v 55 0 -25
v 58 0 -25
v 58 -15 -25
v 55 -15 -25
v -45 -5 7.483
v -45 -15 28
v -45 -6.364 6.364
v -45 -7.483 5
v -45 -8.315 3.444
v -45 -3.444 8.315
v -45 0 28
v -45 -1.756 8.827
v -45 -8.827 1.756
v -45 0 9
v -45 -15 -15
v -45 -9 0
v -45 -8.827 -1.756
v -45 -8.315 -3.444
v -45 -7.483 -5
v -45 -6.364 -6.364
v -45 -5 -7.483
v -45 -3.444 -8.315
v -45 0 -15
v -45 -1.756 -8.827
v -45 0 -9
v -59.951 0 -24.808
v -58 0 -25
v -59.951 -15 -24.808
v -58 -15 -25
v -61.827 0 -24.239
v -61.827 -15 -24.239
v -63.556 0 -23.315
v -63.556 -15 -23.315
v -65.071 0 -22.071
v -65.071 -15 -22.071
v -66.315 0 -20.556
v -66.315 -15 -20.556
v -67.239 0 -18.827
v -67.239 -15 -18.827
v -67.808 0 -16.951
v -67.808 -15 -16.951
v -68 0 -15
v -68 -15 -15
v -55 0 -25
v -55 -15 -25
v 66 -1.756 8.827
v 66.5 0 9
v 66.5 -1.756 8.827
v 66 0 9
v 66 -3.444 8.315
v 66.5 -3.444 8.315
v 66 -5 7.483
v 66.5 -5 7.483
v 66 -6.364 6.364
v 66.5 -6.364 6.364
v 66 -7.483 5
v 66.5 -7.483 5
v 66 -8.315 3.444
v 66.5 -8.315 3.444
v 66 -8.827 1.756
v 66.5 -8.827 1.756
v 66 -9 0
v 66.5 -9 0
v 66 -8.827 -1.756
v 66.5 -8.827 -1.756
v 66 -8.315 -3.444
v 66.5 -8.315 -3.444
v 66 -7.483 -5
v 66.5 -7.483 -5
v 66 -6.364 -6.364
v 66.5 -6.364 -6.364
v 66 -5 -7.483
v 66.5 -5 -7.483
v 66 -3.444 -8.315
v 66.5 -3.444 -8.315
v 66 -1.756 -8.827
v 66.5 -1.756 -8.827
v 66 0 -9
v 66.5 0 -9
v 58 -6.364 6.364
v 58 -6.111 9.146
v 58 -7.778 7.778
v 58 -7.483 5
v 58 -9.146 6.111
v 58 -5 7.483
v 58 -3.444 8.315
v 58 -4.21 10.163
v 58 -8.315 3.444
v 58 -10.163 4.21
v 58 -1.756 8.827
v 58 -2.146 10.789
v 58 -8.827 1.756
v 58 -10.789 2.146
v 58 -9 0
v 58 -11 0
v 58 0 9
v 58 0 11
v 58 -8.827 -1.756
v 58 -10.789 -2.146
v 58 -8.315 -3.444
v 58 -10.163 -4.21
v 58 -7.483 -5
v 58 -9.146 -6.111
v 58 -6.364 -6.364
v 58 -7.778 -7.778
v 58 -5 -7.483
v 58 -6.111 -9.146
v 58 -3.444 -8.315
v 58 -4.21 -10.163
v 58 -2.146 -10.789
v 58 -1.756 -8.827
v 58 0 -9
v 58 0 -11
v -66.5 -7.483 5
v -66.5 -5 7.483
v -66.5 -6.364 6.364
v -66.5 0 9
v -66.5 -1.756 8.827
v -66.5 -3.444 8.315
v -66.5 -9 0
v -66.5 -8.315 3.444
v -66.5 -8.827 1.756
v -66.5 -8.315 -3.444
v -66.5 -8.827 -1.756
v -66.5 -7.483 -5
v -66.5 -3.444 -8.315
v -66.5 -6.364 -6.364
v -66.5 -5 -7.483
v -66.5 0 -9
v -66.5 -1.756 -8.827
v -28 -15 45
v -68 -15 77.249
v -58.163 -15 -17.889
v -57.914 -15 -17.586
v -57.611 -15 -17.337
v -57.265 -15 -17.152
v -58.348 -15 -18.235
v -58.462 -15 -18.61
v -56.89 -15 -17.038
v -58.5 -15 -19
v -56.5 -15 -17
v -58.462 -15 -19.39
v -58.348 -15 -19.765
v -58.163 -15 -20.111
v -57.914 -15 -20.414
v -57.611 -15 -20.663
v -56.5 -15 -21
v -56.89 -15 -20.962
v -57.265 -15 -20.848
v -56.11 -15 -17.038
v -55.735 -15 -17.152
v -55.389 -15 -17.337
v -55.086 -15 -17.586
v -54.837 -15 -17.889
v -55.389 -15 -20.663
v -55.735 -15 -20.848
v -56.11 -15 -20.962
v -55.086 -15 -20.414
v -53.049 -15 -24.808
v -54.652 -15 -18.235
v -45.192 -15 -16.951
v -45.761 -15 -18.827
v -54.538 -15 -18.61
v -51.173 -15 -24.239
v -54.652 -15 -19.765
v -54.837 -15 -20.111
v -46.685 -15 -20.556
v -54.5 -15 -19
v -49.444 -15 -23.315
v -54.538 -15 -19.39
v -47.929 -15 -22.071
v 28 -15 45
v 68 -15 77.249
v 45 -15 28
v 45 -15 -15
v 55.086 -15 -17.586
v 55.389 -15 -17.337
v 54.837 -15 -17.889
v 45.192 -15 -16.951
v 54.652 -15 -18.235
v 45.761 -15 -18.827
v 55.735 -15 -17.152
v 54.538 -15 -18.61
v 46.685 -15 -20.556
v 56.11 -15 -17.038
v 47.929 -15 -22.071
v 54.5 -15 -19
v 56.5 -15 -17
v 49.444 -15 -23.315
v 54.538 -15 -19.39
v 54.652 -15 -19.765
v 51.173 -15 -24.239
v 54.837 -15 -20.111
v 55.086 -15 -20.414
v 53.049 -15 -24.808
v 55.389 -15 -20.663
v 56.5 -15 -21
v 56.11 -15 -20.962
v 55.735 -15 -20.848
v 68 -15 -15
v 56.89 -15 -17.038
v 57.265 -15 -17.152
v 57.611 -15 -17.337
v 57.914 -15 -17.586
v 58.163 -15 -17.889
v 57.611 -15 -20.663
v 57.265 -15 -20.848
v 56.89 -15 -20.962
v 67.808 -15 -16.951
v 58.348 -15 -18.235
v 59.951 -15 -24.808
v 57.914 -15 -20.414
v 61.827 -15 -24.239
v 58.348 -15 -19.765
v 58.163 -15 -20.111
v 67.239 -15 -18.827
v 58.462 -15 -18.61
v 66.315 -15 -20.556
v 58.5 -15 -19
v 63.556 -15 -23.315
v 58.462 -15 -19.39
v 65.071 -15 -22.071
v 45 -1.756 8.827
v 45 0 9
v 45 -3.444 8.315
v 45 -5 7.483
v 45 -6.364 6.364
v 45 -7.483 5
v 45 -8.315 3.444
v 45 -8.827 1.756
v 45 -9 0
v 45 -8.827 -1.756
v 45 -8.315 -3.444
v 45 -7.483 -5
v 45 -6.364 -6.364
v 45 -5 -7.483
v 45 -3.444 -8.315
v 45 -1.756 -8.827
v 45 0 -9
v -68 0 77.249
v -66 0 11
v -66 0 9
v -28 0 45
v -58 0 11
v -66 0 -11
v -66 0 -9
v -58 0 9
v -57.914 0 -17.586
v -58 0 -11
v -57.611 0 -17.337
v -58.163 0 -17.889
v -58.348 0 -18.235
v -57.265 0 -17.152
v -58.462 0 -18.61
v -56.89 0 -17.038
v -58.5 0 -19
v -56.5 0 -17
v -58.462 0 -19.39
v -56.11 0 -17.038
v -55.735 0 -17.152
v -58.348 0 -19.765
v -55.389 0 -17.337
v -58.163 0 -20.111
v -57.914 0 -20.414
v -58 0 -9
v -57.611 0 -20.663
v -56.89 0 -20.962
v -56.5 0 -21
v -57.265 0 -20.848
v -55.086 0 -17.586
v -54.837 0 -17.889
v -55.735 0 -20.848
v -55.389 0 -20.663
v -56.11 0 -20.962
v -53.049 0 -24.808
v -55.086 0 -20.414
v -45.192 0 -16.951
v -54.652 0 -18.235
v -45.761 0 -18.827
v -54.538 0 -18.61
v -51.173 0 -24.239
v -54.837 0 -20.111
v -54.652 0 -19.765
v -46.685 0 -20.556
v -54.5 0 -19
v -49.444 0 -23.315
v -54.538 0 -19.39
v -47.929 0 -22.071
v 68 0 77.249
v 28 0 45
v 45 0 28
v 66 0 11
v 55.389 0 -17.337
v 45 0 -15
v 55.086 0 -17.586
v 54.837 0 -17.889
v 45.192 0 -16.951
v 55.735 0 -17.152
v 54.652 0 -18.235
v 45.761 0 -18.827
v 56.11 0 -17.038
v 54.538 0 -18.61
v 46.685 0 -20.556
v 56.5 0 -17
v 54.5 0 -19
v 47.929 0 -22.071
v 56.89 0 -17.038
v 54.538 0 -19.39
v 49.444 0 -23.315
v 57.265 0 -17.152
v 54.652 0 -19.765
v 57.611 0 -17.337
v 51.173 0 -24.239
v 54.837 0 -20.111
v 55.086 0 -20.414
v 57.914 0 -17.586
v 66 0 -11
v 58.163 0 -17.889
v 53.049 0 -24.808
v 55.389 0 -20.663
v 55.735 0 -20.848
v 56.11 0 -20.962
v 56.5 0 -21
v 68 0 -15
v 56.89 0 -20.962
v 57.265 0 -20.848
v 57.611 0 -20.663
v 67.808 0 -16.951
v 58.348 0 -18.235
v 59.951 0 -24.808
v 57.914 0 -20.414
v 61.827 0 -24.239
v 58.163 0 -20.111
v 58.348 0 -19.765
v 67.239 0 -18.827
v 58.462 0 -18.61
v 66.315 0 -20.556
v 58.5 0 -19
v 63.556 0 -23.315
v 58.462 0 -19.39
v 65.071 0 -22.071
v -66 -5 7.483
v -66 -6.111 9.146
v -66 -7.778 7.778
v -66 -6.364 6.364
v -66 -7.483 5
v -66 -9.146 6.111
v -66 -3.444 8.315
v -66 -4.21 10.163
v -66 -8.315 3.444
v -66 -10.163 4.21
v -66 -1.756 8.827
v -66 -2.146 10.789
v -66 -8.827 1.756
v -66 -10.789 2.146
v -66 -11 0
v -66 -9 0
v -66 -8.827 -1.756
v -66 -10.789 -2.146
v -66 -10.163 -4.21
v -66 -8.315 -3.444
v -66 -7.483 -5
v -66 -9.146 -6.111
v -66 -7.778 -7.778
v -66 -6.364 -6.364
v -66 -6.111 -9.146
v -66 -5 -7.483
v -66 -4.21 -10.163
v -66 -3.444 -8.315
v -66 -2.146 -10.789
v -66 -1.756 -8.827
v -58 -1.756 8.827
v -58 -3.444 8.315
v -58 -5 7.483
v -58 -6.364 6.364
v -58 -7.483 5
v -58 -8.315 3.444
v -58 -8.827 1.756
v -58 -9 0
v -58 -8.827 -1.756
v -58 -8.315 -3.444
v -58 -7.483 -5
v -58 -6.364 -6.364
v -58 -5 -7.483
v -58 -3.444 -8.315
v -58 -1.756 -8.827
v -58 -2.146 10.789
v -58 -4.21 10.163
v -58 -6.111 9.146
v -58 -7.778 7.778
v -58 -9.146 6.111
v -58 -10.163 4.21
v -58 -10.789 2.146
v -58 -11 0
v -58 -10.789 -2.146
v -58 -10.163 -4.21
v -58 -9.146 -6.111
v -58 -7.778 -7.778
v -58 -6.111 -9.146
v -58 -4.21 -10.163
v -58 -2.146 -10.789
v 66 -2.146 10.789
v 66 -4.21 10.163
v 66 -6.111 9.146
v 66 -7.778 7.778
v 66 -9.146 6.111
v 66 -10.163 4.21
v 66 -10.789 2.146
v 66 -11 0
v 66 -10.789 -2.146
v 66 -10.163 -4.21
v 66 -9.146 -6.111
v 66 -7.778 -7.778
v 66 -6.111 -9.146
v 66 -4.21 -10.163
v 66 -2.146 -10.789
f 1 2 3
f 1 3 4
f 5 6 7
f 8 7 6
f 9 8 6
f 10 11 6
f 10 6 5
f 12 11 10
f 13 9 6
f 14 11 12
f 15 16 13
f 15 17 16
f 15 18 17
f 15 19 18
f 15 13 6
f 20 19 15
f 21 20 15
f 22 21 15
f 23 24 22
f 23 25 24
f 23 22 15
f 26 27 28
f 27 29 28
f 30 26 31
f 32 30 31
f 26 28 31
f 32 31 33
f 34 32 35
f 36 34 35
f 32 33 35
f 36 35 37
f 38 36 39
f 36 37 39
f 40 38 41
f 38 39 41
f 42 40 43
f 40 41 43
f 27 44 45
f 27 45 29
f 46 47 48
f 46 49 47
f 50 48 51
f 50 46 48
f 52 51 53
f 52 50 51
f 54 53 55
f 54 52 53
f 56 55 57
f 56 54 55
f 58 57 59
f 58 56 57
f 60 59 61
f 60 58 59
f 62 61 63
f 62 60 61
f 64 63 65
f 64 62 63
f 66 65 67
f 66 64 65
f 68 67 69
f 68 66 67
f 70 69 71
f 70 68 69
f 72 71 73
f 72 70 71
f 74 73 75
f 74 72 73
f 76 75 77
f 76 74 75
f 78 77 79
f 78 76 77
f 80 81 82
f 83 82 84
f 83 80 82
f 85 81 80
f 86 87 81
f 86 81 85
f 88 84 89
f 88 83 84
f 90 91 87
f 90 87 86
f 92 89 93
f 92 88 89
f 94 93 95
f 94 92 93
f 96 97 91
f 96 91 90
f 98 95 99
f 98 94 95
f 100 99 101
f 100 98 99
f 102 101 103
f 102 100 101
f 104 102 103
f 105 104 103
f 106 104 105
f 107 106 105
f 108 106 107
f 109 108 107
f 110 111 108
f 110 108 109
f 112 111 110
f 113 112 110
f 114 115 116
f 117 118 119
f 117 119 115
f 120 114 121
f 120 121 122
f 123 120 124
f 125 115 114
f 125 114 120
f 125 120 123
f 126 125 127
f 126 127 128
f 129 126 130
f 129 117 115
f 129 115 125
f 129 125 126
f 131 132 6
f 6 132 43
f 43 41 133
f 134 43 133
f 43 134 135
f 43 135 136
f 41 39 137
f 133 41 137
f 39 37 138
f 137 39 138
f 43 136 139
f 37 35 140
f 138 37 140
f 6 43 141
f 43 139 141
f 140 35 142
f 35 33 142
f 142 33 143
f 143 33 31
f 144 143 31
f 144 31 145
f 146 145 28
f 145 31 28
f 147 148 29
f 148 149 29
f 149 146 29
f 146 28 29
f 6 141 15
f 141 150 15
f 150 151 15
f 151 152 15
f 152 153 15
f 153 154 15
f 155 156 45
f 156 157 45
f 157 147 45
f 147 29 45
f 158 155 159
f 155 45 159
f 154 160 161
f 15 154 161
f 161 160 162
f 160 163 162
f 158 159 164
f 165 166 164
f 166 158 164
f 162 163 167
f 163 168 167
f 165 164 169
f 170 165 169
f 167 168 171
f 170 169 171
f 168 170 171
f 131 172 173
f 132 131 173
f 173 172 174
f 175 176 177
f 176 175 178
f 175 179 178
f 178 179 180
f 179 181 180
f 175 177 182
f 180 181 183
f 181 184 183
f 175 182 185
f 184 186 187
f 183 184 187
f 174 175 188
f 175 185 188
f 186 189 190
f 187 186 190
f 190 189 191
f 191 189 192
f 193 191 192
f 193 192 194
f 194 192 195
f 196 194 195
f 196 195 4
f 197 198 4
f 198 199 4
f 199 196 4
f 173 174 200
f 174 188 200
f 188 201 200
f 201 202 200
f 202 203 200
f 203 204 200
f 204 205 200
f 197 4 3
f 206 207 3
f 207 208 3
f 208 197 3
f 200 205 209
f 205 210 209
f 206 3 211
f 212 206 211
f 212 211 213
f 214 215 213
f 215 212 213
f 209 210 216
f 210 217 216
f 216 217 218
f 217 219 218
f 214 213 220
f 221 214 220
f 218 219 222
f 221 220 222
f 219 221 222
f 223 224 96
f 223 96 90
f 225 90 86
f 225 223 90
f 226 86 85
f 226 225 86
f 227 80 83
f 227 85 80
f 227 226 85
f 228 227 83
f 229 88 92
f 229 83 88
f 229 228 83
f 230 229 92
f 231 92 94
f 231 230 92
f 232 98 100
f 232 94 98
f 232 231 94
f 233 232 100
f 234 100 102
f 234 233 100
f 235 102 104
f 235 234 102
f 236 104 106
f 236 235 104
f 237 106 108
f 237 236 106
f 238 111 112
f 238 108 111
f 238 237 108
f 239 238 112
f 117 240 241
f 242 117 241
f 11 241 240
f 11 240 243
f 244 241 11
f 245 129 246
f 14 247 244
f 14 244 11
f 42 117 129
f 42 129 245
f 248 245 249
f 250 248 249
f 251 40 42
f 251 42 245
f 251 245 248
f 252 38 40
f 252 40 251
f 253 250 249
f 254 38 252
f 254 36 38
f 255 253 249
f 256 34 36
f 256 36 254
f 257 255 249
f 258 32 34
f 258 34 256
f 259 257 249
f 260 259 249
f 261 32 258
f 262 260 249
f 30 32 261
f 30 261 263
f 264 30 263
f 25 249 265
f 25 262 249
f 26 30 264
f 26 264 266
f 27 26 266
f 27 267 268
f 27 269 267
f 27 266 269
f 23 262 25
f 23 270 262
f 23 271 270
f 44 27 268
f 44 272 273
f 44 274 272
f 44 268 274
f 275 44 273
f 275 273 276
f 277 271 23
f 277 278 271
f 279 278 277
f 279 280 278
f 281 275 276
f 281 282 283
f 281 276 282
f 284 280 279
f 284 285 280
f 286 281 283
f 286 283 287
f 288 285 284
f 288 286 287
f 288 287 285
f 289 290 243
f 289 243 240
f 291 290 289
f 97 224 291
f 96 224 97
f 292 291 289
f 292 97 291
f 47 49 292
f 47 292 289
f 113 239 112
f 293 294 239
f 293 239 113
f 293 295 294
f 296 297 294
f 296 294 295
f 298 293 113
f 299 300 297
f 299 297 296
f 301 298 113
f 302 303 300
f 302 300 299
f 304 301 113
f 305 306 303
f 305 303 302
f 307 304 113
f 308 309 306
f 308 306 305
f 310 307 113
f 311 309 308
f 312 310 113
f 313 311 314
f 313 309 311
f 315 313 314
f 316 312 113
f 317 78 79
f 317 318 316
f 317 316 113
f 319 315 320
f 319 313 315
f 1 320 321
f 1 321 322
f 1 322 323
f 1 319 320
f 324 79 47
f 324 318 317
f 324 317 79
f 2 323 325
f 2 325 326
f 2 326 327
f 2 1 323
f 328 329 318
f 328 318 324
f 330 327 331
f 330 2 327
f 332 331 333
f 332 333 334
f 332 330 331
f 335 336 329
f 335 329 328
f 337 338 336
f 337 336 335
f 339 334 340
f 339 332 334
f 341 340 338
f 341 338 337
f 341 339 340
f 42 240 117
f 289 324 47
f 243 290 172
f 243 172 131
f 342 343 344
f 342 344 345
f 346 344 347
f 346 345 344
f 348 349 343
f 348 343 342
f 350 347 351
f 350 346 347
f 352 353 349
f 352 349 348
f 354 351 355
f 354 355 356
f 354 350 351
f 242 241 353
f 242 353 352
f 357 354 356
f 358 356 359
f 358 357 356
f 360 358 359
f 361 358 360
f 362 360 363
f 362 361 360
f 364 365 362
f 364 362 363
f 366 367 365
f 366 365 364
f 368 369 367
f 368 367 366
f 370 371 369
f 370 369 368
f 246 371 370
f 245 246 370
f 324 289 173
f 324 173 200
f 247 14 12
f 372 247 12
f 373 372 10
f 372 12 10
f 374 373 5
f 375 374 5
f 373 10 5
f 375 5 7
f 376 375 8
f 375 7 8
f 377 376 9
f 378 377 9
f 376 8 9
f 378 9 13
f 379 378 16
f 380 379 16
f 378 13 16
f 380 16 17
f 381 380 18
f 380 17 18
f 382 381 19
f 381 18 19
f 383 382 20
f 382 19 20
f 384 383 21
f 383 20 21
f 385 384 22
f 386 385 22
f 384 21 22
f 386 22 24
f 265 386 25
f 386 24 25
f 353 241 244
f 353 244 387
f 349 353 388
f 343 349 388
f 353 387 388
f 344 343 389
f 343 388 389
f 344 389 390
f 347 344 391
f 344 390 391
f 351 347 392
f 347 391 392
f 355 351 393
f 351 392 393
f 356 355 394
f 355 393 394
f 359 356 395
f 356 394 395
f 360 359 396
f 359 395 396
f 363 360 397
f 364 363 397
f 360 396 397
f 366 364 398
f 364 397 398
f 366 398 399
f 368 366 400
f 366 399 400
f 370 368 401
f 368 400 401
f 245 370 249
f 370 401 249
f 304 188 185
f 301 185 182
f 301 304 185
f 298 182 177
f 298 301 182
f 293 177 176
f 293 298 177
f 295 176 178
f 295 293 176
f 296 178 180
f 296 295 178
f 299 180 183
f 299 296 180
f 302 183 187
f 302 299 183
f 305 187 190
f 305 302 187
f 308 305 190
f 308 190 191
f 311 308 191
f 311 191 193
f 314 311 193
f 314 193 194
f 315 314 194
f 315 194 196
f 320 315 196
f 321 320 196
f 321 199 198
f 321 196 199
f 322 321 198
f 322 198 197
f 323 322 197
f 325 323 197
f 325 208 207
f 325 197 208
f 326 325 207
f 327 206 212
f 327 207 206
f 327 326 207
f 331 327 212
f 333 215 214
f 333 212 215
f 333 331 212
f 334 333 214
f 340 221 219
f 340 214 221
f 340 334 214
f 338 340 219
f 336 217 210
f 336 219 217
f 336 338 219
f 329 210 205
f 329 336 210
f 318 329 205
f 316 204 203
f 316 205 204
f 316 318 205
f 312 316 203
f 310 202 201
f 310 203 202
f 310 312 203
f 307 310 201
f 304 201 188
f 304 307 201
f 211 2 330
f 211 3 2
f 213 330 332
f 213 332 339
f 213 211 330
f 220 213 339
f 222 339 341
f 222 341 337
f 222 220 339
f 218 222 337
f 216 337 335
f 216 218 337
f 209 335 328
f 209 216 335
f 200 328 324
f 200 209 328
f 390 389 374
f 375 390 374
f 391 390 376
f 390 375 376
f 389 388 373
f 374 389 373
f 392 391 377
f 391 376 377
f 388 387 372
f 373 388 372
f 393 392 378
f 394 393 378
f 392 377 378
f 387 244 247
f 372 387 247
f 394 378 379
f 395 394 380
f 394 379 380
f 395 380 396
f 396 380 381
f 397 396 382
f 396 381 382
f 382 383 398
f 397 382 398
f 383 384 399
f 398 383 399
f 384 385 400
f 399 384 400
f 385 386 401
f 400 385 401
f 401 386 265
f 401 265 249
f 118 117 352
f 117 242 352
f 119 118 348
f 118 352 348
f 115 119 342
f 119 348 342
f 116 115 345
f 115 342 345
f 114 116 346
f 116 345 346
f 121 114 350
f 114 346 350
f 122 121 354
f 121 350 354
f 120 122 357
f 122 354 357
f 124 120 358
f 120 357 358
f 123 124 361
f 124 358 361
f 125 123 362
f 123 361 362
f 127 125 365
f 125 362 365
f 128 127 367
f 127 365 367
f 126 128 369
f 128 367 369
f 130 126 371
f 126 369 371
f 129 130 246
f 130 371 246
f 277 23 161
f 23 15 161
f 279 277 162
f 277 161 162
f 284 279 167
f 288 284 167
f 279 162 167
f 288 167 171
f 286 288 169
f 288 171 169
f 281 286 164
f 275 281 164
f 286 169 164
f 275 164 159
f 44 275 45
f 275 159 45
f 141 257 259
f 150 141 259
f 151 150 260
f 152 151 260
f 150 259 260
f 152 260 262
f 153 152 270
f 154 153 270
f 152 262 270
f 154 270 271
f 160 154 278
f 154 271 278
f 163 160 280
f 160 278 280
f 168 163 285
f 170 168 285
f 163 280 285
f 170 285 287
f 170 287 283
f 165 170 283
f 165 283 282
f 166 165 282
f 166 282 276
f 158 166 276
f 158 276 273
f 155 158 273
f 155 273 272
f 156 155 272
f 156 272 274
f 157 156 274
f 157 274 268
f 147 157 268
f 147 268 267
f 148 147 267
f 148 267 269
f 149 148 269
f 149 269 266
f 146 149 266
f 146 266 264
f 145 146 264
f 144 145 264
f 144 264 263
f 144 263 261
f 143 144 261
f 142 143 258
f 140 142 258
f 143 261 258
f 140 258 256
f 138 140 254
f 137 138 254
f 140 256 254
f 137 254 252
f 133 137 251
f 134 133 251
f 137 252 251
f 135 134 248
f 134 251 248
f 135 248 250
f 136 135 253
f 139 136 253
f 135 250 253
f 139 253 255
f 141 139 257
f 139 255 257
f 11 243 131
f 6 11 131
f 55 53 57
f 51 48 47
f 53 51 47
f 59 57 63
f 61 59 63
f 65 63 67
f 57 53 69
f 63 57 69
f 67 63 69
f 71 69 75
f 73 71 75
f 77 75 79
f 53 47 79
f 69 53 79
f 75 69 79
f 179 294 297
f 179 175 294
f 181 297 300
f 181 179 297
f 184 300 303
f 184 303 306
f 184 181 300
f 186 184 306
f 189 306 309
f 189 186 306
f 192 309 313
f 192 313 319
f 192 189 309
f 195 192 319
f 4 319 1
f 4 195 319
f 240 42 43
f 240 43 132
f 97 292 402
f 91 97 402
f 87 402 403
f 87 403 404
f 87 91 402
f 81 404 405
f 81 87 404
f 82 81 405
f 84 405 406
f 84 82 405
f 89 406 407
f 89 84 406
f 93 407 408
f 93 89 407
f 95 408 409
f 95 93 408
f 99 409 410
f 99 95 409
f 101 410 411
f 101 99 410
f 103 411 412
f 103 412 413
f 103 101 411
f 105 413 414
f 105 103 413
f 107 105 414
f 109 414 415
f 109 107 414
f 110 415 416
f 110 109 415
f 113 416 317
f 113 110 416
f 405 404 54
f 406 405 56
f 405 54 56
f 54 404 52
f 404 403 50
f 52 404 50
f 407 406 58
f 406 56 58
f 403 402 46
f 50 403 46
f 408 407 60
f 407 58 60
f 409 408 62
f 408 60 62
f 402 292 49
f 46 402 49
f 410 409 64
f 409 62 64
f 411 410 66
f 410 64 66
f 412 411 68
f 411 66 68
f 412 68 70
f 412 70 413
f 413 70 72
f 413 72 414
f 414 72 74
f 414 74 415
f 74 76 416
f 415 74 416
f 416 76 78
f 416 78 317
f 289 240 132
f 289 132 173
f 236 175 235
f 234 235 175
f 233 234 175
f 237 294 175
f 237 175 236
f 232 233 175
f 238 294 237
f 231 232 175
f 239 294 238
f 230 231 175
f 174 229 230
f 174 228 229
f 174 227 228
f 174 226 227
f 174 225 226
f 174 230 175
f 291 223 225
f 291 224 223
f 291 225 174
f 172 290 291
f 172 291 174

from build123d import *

# Parameters (mm, degrees)
BOSS_EXTRUDE1_DEPTH = 15
SKETCH2_R           = 9
CUT_EXTRUDE1_DEPTH  = 66.5
CUT_EXTRUDE2_START  = -58
SKETCH4_R           = 11
CUT_EXTRUDE2_DEPTH  = 8
CHAMFER1_SIZE       = 17
SKETCH5_R           = 2
CUT_EXTRUDE3_DEPTH  = 105.002294435
FILLET1_R           = 10


with BuildPart() as part:
    # Sketch1 → Boss-Extrude1 (new body)
    with BuildSketch(Plane(origin=(0, 0, 0), x_dir=(1, 0, 0), z_dir=(0, 1, 0))):
        Polygon((-45, 25), (-68, 25), (-68, -77.249448203), (68, -77.249448203), (68, 25), (45, 25), (45, -45), (-45, -45), align=None)
    extrude(amount=-BOSS_EXTRUDE1_DEPTH)

    # Sketch2 → Cut-Extrude1 (cut)
    with BuildSketch(Plane(origin=(0, 0, 0), x_dir=(0, 0, -1), z_dir=(1, 0, 0))):
        Circle(SKETCH2_R)
    cut_extrude1 = extrude(amount=-CUT_EXTRUDE1_DEPTH, mode=Mode.SUBTRACT)

    # Sketch4 → Cut-Extrude2 (cut)
    with BuildSketch(Plane(origin=(0, 0, 0), x_dir=(0, 0, -1), z_dir=(1, 0, 0)).offset(CUT_EXTRUDE2_START)):
        Circle(SKETCH4_R)
    cut_extrude2 = extrude(amount=-CUT_EXTRUDE2_DEPTH, mode=Mode.SUBTRACT)

    # Chamfer1
    chamfer1_edges = [part.edges().sort_by_distance(p)[0] for p in [
        (-45, -7.5, 45),
        (45, -7.5, 45),
    ]]
    chamfer(chamfer1_edges, length=CHAMFER1_SIZE)

    # Sketch5 → Cut-Extrude3 (cut, through all)
    with BuildSketch(Plane(origin=(0, 0, 0), x_dir=(1, 0, 0), z_dir=(0, 1, 0))):
        with Locations(Location((-56.5, 19, 0), (0, 0, 270))):
            Circle(SKETCH5_R)
    cut_extrude3 = extrude(amount=-CUT_EXTRUDE3_DEPTH, mode=Mode.SUBTRACT)

    # Fillet1
    fillet1_edges = [part.edges().sort_by_distance(p)[0] for p in [
        (45, -7.5, -25),
        (68, -7.5, -25),
        (-68, -7.5, -25),
        (-45, -7.5, -25),
    ]]
    fillet(fillet1_edges, radius=FILLET1_R)

    # Mirror2: Cut-Extrude1, Cut-Extrude2, Cut-Extrude3 across plane
    add(cut_extrude1.mirror(Plane(origin=(0, 0, 0), x_dir=(0, 0, 1), z_dir=(1, 0, 0))), mode=Mode.SUBTRACT)
    add(cut_extrude2.mirror(Plane(origin=(0, 0, 0), x_dir=(0, 0, 1), z_dir=(1, 0, 0))), mode=Mode.SUBTRACT)
    add(cut_extrude3.mirror(Plane(origin=(0, 0, 0), x_dir=(0, 0, 1), z_dir=(1, 0, 0))), mode=Mode.SUBTRACT)


solid = part.part
